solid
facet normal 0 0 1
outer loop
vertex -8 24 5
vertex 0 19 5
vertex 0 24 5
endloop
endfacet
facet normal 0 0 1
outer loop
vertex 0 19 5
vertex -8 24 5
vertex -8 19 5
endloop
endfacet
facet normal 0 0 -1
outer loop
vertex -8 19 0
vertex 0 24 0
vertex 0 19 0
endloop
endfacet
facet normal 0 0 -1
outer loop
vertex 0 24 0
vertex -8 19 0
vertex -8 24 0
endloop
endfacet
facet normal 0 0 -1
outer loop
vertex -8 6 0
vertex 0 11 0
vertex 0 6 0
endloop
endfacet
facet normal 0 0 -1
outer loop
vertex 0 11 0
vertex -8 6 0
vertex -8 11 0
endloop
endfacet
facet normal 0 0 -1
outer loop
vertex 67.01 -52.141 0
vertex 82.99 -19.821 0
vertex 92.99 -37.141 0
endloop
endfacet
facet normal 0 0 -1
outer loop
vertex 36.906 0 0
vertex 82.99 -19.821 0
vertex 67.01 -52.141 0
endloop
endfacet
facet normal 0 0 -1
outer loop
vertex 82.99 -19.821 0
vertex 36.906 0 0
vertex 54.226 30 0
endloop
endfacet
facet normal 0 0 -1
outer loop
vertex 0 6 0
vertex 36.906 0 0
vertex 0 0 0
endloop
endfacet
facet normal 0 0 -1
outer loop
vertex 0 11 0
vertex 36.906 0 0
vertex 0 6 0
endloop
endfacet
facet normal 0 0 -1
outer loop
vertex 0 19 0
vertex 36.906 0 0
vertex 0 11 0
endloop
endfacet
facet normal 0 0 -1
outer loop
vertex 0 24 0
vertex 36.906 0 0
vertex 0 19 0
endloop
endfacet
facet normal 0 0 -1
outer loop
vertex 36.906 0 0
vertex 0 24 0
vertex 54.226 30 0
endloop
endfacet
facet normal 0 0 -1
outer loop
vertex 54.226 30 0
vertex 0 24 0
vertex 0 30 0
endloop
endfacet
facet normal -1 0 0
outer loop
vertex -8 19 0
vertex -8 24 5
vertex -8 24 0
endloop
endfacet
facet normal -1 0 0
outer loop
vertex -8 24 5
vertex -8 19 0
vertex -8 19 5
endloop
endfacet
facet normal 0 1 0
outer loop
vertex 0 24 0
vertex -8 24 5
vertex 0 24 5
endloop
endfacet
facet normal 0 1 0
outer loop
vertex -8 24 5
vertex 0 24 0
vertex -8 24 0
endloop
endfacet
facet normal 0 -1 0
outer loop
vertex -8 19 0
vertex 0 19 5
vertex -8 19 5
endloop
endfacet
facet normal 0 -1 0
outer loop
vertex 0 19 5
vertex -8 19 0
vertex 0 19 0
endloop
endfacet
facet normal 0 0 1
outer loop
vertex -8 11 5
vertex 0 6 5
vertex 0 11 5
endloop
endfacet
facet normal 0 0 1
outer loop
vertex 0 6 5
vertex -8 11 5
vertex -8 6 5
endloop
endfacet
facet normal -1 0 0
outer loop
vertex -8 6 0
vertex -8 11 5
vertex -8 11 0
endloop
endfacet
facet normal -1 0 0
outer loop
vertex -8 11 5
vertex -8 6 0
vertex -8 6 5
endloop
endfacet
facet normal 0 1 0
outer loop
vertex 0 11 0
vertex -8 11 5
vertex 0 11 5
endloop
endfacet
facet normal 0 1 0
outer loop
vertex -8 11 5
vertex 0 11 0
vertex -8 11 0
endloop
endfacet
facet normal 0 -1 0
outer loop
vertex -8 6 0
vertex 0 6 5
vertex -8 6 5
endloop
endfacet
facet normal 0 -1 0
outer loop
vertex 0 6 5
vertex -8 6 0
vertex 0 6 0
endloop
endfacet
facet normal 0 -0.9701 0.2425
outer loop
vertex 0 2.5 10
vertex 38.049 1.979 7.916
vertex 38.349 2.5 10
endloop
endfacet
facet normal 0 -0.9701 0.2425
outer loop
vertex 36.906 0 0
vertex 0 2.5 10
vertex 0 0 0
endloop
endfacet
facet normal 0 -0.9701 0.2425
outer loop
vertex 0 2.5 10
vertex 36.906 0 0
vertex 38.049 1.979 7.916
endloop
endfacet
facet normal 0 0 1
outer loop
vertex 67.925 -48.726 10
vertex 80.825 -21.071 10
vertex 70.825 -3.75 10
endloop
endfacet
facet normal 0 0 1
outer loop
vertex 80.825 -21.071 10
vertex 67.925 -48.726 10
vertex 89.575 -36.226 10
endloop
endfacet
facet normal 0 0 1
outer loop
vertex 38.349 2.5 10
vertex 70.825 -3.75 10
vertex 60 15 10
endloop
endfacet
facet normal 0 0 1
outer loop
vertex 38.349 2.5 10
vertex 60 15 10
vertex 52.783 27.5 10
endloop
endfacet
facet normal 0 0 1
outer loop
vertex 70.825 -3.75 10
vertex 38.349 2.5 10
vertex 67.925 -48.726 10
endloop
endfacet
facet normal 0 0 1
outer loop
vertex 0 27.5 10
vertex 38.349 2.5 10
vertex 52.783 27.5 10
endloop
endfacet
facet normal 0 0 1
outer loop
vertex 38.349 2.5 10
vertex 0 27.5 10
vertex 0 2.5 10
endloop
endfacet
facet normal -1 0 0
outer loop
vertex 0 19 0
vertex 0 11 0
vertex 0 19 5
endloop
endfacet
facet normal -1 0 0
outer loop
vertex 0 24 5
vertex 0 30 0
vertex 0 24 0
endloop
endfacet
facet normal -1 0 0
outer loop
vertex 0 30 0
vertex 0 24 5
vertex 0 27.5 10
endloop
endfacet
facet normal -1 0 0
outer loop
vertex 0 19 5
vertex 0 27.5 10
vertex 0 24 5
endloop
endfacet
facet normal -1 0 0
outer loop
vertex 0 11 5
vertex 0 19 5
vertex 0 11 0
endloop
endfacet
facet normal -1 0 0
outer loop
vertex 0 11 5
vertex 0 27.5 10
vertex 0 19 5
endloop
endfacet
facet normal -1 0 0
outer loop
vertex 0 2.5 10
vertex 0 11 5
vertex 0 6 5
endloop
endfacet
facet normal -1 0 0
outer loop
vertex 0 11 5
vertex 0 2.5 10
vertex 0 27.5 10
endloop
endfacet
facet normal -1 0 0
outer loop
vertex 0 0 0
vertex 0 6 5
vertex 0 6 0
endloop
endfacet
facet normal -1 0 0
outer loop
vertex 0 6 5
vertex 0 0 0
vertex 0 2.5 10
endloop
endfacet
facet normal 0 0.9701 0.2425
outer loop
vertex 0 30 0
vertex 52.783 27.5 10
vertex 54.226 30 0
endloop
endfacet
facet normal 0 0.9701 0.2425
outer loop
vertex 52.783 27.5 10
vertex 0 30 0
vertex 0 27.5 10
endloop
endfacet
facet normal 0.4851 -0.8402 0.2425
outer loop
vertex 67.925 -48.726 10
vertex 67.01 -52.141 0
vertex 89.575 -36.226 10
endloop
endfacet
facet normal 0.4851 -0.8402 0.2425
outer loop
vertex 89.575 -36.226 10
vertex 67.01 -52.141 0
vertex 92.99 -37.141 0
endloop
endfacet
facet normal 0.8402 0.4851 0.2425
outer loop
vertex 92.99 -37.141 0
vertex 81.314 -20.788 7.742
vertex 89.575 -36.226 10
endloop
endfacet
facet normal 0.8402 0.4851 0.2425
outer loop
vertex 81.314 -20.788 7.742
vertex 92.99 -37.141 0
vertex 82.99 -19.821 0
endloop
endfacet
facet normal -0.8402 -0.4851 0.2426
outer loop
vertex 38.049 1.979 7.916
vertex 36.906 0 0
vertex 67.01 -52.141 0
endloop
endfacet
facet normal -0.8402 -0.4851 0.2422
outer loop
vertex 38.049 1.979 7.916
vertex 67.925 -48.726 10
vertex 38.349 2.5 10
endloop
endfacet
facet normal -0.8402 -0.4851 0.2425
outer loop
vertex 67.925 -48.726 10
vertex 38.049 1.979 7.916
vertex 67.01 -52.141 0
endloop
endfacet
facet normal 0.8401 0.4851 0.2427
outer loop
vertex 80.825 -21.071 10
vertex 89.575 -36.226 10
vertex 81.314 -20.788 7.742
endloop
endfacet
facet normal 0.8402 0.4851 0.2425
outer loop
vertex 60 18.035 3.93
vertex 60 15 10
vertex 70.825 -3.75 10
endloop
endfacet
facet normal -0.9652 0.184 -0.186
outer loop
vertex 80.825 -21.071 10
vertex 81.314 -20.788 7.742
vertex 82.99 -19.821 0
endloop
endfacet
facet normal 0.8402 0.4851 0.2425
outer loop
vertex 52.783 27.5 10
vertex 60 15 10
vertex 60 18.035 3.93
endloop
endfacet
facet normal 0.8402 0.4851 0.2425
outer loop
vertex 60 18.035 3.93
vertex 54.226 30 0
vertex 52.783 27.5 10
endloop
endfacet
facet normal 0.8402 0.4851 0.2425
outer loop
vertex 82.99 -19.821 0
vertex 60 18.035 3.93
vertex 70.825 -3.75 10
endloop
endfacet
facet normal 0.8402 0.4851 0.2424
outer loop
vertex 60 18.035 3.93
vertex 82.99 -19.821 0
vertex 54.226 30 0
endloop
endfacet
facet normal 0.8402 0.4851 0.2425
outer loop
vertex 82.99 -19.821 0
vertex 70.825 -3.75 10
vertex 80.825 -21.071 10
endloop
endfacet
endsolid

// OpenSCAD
// file: ../library/shapes.scad
module truncated_pyramid(bottom=[2,2], top=[1,1], height=1) {
  delta_x = (bottom[0]-top[0])/2;
  delta_y = (bottom[1]-top[1])/2;
  polyhedron(points=[
      [0, 0, 0],
      [bottom[0], 0, 0],
      [bottom[0], bottom[1], 0],
      [0, bottom[1], 0],
      [delta_x, delta_y, height],
      [top[0]+delta_x, delta_y, height],
      [top[0]+delta_x, top[1]+delta_y, height],
      [delta_x, top[1]+delta_y, height],
    ],
    faces=[
      [0, 1, 2, 3],  // bottom
      [4, 5, 1, 0],  // front
      [7, 6, 5, 4],  // top
      [5, 6, 2, 1],  // right
      [6, 7, 3, 2],  // back
      [7, 4, 0, 3]   // left
    ]
  );
}
// file: ../library/hex.scad
// Module hexagon
// R is radius across flat sides, not points
// points are (2/sqrt(3))*r
module hexagon(r){
    polygon(points=[
                [r,(r*(tan(30)))],
                [0,(r*(2/sqrt(3)))],
                [-r,(r*(tan(30)))],
                [-r,-(r*(tan(30)))],
                [0,-(r*(2/sqrt(3)))],
                [r,-(r*(tan(30)))]
    ]);
}

// Repeat something on each side
module hexagon_each(r, offset=30) {
    for (a = [0:60:359]) {
        rotate([0, 0, a+offset]) {
            translate([0, r, 0]) {
                children();
            }
        }
    }
}

// Repeat something in 3 positions
module hexagon_tri_each(r, offset=30) {
    for (a = [0:120:359]) {
        rotate([0, 0, a+offset]) {
            translate([0, r, 0]) {
                children();
            }
        }
    }
}
// main file
use <../library/hex.scad>
use <../library/shapes.scad>

module finger_joint(width=20, hole_dia=3, length=30, depth=20, n_fingers=3, tol=0) {
  union() {
    intersection() {
      difference() {
        union() {
          finger_depth = depth/n_fingers/2;
          for(i=[0:n_fingers-1]) {
            translate([0, i*finger_depth*2, 0])
              cube([length, finger_depth-tol, width]);
          }
        }
        translate([length-width/2, depth, width/2])
          rotate([90, 0, 0])
          cylinder(d=hole_dia+2*tol, h=depth*2, $fn=32);
      }
      union() {
        cube([length-width/2, depth, width]);
        translate([length-width/2, depth, width/2])
          rotate([90, 0, 0])
          cylinder(d=width, h=depth, $fn=32);
      }
    }
    // Hex nut holder
    translate([length-width/2, 0, width/2]) {
      rotate([90, 0, 0])
      difference() {
        cylinder(d=hole_dia*3, h=hole_dia, $fn=32);
        linear_extrude(hole_dia)
          hexagon(hole_dia);
      }
    }
  }
}

module finger_joint_bar(width=12, depth=14, length=80, tol=0) {
  joint_length = 1.5*width;
  bar_length = length-2*joint_length;
  translate([joint_length, 0, 0]) {
    translate([bar_length, 0, 0])
      finger_joint(width=width, depth=depth, length=joint_length, tol=tol);
    translate([0, depth, 0])
      rotate([0, 0, 180])
      finger_joint(width=width, depth=depth, length=joint_length, tol=tol);
    cube([bar_length, depth, width]);
  }
}

module microscope_end(holder_dia=30, depth=14, tol=0, hole_dia=3) {
  wall_thick = 6;
  outer_dia = holder_dia+wall_thick;
  thickness = hole_dia*3+1;
  difference() {
    union() {
      cylinder(d=outer_dia, h=thickness, $fn=32);
      translate([holder_dia/2, -depth/2, 0])
        cube([wall_thick, depth, thickness]);
      translate([holder_dia/2+wall_thick, -depth/2, 0])
        finger_joint(width=thickness, depth=depth, length=1.5*thickness, hole_dia=hole_dia, tol=tol);
      translate([-holder_dia+wall_thick/2, -wall_thick/2, 0]) {
        union() {
          cube([hole_dia*3+wall_thick/2, wall_thick, thickness]);
          // Hex nut holder
          translate([hole_dia*1.5, 0, thickness/2]) {
            rotate([90, 0, 0])
            difference() {
              cylinder(d=hole_dia*3, h=hole_dia, $fn=32);
              linear_extrude(hole_dia)
                hexagon(hole_dia);
            }
          }
        }
      }
    } // end union
    cylinder(d=holder_dia+2*tol, h=thickness, $fn=32);
    translate([-holder_dia, -1/2, 0])
      cube([hole_dia*6, 1, thickness]);
    #translate([-holder_dia+wall_thick/2+hole_dia*1.5, wall_thick/2, thickness/2])
      rotate([90, 0, 0])
      cylinder(d=hole_dia+tol, h=wall_thick, $fn=32);
  }
}

module microscope_base(base_length=50, base_depth=30, base_height=10, bracket_width=12, bracket_depth=14, hole_dia=3, tol=0) {
  translate([base_length*cos(30), 0, 0])
  difference() {
    union() {
      truncated_pyramid(bottom=[base_length, base_depth], top=[base_length, base_depth-5], height=base_height);
      translate([base_length/2-bracket_depth/2, base_depth/2-bracket_width/2, base_height])
        rotate([0, -90, -90])
        finger_joint(width=bracket_width, depth=bracket_depth, length=bracket_width*1.5, hole_dia=hole_dia, tol=tol);

      // Wings
      translate([-base_length/2+base_depth/2*cos(30), base_depth*sin(30)/3, 0]) {
        rotate([0, 0, 30])
        difference() {
          translate([-base_length/2, -base_depth/2, 0])
            truncated_pyramid(bottom=[base_length, base_depth], top=[base_length, base_depth-5], height=base_height);
          translate([-base_length/2, 4, 0])
            cube([10, 5+tol, 5]);
          translate([-base_length/2, -9, 0])
            cube([10, 5+tol, 5]);
        }
      }
      translate([base_length*3/2-base_depth/2*cos(30), base_depth*sin(30)/3, 0]) {
        rotate([0, 0, -30])
        difference() {
          translate([-base_length/2, -base_depth/2, 0])
            truncated_pyramid(bottom=[base_length, base_depth], top=[base_length, base_depth-5], height=base_height);
          translate([base_length/2-10, 4, 0])
            cube([10, 5+tol, 5]);
          translate([base_length/2-10, -9, 0])
            cube([10, 5+tol, 5]);
        }
      }
    }
    // These cleanup the edges of the overlaps oops
    translate([0, base_depth*2-5/2, base_height])
      rotate([180, 0, 0])
      truncated_pyramid(bottom=[base_length, base_depth], top=[base_length, base_depth-5], height=base_height);
    translate([base_length*3/2-base_depth/2*cos(30), base_depth*sin(30)/3, base_height]) {
      rotate([0, 0, -30])
      translate([0, base_depth-5/2, 0])
      rotate([180, 0, 0])
      translate([-base_length/2, -base_depth/2, 0])
      truncated_pyramid(bottom=[base_length, base_depth], top=[base_length, base_depth-5], height=base_height);
    }
    translate([-base_length/2+base_depth/2*cos(30), base_depth*sin(30)/3, base_height]) {
      rotate([0, 0, 30])
      translate([0, base_depth-5/2, 0])
      rotate([180, 0, 0])
      translate([-base_length/2, -base_depth/2, 0])
      truncated_pyramid(bottom=[base_length, base_depth], top=[base_length, base_depth-5], height=base_height);
    }
  }
}

module microscope_leg(length=80, width=60, depth=30, height=10, tol=0) {
  // tied to some values in microscope_base
  difference() {
    union() {
      truncated_pyramid(bottom=[width, depth], top=[width, depth-5], height=height);
      translate([width, -length*cos(60)/4, 0])
        rotate([0, 0, -60])
        translate([-length/2, -depth/2, 0])
        truncated_pyramid(bottom=[length, depth], top=[length-5, depth-5], height=height);
      // pins
      translate([0, depth/2, 0]) {
        translate([-8, 4, 0])
          cube([10, 5-tol, 5]);
        translate([-8, -9, 0])
          cube([10, 5-tol, 5]);
      }
    }
    translate([0, 2*depth-5/2, height])
      rotate([180, 0, 0])
      truncated_pyramid(bottom=[width, depth], top=[width, depth-5], height=height);
    #translate([width, -length*cos(60)/4, 0])
      rotate([0, 0, -60])
      translate([0, depth-5/2, height])
      rotate([180, 0, 0])
      translate([-length/2, -depth/2, 0])
      truncated_pyramid(bottom=[width, depth], top=[width, depth-5], height=height);
  }
}

//finger_joint_bar(length=100, tol=0.15);
//microscope_end(tol=0.15);
//microscope_base(tol=0.15);
microscope_leg();
